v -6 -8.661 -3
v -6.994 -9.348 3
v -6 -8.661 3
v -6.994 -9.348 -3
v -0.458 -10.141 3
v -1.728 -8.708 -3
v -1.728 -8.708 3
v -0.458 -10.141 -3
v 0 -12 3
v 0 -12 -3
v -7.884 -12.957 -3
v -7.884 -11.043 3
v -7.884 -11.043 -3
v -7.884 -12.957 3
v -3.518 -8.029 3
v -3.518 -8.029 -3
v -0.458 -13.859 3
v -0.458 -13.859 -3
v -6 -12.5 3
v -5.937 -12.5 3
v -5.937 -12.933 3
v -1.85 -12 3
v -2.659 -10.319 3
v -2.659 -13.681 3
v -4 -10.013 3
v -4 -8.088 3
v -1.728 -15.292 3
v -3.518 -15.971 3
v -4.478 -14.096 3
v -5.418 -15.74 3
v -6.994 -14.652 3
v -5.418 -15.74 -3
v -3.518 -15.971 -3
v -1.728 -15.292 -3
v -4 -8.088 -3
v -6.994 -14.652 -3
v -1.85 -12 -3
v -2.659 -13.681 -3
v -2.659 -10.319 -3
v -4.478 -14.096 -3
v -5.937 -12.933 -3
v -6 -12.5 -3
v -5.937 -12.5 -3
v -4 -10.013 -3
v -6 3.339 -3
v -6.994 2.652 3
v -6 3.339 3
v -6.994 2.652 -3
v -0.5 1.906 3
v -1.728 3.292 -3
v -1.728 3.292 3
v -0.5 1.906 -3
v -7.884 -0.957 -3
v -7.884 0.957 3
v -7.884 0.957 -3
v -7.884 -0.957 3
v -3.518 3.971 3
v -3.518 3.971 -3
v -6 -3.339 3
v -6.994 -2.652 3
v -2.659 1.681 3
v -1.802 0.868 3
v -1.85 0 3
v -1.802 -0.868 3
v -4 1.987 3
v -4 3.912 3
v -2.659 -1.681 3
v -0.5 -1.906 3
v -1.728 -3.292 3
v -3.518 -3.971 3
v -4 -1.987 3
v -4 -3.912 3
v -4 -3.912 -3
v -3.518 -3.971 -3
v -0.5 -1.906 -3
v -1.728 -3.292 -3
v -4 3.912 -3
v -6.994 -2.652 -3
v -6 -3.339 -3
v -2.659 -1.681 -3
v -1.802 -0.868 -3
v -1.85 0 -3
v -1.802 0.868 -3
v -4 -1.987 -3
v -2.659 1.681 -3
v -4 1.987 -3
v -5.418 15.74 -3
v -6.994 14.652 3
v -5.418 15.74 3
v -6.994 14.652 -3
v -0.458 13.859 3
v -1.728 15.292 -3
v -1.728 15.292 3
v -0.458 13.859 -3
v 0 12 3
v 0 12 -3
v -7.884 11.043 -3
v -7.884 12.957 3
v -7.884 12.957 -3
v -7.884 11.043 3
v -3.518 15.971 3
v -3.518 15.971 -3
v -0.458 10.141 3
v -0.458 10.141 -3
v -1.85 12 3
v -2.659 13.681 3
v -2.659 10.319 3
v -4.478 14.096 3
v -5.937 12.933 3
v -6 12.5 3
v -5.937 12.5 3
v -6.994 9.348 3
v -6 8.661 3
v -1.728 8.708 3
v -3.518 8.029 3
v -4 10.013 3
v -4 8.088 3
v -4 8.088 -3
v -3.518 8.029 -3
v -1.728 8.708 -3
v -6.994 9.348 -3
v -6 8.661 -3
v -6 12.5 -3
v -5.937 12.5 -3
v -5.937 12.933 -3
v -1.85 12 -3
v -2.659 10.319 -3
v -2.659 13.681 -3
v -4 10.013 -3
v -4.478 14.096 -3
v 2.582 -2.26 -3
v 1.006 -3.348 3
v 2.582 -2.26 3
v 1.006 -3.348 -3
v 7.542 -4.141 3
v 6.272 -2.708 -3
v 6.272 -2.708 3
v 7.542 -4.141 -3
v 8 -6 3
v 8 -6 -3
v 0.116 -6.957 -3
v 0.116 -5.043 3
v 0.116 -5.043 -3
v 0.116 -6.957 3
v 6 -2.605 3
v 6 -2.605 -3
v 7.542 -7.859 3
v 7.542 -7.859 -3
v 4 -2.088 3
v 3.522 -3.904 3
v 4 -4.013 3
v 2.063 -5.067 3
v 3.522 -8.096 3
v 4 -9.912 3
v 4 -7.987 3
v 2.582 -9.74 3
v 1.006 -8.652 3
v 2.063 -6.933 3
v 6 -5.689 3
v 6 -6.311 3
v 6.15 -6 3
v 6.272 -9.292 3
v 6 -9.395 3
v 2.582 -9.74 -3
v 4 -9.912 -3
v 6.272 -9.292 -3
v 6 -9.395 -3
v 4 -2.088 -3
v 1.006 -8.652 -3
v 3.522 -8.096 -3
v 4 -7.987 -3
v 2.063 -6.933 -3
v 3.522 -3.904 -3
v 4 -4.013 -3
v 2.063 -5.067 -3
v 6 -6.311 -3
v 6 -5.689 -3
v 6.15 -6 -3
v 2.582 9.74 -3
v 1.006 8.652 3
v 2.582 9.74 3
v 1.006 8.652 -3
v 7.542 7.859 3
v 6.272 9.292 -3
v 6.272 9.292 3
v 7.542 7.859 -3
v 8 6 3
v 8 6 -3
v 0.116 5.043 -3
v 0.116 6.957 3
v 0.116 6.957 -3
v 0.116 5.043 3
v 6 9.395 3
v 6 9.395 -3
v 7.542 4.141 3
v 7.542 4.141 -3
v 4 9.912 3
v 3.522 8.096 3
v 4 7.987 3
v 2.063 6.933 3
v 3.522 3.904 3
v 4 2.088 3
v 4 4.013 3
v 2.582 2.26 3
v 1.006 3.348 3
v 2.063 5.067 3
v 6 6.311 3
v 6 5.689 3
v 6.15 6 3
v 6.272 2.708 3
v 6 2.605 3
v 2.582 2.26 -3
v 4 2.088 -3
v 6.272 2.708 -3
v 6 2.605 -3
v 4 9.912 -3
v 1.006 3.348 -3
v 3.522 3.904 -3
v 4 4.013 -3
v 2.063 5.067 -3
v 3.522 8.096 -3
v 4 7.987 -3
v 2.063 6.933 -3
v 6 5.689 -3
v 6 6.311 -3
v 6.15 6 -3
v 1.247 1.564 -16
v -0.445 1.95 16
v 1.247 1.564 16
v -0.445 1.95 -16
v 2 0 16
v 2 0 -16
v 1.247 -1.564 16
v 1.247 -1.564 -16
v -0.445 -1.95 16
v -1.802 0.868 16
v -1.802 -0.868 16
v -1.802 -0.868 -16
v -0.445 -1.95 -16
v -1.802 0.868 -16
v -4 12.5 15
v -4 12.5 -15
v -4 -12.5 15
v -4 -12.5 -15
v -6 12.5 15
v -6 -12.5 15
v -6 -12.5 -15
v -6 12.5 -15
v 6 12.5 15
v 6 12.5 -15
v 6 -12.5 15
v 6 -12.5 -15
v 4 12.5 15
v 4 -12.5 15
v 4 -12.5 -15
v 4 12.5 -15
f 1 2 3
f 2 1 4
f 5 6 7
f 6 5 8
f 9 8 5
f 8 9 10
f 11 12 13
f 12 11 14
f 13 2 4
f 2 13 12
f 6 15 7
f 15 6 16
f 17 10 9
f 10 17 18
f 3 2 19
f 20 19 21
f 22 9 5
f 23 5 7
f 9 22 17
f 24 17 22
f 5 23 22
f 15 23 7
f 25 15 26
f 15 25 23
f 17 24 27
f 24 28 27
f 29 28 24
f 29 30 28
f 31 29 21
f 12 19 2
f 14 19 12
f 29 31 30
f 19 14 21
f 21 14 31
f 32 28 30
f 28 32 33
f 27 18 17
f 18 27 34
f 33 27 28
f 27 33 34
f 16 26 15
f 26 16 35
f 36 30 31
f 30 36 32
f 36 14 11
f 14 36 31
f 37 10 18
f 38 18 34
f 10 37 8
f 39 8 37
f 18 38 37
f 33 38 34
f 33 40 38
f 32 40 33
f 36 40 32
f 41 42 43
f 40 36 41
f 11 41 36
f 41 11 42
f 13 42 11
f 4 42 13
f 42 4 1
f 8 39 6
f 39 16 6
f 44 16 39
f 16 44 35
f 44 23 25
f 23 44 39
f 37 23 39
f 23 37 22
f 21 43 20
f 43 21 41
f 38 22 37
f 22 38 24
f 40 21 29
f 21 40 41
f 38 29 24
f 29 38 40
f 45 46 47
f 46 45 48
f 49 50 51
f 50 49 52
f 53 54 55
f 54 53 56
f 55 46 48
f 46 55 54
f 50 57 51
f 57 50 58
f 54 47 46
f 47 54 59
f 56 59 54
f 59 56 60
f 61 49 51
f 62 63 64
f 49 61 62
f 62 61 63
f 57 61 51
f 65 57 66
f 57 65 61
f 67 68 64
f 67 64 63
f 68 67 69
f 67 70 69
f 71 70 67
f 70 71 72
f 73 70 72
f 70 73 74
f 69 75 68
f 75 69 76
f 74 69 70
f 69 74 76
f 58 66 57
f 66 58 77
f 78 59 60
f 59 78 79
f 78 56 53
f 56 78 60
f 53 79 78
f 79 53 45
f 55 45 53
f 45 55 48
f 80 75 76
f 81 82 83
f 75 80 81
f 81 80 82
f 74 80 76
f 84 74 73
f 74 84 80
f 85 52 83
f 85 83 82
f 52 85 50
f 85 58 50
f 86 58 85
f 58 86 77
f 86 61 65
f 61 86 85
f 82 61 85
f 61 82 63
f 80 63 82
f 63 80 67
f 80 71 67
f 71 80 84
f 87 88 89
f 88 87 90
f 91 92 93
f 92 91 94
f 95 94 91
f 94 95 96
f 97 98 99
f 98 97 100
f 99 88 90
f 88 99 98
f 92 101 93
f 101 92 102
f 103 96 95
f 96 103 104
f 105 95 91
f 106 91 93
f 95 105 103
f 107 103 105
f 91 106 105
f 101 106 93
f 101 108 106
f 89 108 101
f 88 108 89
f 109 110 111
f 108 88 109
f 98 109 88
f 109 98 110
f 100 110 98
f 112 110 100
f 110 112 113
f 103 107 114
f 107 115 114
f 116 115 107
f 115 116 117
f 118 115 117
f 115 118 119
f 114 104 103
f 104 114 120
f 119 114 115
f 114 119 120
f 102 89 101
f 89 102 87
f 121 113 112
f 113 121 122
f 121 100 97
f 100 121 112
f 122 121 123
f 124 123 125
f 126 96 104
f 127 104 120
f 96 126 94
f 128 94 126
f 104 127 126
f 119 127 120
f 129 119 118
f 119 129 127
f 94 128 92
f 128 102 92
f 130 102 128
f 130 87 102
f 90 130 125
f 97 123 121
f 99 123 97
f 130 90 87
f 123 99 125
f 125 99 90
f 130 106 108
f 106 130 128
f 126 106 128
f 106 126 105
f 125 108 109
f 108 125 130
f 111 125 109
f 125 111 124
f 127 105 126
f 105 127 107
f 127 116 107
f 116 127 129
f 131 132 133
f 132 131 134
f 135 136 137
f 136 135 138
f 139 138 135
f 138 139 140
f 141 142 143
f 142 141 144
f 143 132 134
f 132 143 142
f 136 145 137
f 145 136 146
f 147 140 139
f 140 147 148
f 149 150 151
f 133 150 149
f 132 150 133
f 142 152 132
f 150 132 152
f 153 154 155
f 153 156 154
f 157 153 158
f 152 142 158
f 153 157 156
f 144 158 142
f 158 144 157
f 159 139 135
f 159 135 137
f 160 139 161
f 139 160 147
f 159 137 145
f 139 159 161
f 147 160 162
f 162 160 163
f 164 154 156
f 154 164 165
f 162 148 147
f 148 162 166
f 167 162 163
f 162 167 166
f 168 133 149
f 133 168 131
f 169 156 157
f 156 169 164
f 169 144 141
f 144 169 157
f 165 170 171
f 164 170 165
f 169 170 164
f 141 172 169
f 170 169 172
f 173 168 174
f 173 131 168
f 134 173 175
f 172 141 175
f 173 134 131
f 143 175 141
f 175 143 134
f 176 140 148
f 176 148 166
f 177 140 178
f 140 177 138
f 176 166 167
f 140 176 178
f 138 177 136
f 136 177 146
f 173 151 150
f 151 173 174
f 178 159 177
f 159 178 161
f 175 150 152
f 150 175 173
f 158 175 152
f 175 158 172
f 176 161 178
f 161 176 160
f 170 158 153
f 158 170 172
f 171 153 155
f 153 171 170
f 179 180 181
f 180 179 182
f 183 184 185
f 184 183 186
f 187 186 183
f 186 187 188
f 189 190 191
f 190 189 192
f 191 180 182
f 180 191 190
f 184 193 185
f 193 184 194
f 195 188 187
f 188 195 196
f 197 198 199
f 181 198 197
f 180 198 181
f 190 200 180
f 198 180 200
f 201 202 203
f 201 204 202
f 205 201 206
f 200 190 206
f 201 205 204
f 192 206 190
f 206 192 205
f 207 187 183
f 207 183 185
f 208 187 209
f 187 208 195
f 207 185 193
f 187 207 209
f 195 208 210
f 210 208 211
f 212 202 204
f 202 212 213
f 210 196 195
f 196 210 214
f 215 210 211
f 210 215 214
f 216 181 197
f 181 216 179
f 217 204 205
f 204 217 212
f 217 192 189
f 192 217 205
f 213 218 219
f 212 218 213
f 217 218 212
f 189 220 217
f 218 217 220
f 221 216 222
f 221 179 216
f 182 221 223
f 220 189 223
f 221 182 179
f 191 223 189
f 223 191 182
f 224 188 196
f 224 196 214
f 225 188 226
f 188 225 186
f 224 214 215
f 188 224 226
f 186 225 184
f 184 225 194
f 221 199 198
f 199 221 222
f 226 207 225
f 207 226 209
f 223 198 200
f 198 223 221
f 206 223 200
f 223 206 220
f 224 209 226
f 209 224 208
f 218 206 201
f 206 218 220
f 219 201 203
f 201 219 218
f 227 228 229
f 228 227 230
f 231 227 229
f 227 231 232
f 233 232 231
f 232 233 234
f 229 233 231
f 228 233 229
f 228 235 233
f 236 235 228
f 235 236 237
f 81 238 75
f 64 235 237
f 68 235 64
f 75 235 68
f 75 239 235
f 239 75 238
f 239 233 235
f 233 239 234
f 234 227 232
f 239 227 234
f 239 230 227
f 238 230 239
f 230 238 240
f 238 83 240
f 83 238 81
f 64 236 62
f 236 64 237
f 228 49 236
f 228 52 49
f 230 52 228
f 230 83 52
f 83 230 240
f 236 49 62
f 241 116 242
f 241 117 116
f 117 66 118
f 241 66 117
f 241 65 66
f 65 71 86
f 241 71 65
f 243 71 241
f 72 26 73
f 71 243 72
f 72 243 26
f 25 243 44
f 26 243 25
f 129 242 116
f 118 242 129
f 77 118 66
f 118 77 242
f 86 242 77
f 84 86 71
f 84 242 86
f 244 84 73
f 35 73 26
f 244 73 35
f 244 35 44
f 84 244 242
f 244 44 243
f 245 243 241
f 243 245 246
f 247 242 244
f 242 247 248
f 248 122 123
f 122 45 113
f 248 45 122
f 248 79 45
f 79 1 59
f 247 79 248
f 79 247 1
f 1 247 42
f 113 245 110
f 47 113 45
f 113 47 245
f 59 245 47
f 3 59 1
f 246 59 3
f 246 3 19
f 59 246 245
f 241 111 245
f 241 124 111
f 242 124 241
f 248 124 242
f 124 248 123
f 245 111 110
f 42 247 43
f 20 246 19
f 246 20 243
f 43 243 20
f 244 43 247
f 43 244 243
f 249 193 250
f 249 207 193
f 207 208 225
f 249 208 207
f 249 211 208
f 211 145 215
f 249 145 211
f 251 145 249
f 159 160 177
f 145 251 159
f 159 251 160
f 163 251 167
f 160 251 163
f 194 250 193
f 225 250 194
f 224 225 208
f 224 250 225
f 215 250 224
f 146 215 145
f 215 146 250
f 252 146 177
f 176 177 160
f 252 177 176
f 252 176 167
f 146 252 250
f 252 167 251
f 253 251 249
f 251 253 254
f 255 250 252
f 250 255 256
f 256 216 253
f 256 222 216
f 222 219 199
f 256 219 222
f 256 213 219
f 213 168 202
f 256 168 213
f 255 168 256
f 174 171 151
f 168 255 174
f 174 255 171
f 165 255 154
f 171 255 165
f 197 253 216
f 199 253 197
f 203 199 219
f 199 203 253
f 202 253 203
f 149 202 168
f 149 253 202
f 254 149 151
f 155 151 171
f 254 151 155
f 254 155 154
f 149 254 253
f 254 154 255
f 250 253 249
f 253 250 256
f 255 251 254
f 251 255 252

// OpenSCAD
// Parameters
leaf_width = 25;
leaf_height = 30;
leaf_thickness = 2;
pin_diameter = 4;
pin_length = 32;
knuckle_outer_diameter = 8;
knuckle_inner_diameter = pin_diameter + 0.3;
knuckle_height = 6; // 30mm / 5 equal parts
num_knuckles_left = 3;
num_knuckles_right = 2;
m3_countersink_diameter = 6;
m3_countersink_depth = 1;
m3_hole_diameter = 3.2;
m3_hole_spacing = 8;

module pin() {
    cylinder(h = pin_length, d = pin_diameter, center = true);
}

module knuckle(side) {
    difference() {
        cylinder(h = knuckle_height, d = knuckle_outer_diameter, center = true);
        // Ensure the hole goes all the way through the knuckle
        cylinder(h = knuckle_height + 0.1, d = knuckle_inner_diameter, center = true);
    }
}

// Helper module for creating a conical void for the countersink
module countersink_hole(depth, d_outer, d_inner) {
    // This creates a frustum shape and then a cylinder.
    // The frustum is from the surface (z=0) to 'depth'.
    // The cylinder continues from 'depth' to 'leaf_thickness'.

    // Frustum part
    // hull() creates a shape connecting two 2D shapes.
    // We need to create two circles at the start and end of the frustum.
    hull() {
        circle(d = d_outer);
        translate([depth, 0, 0]) circle(d = d_inner);
    }

    // Cylinder part for the through hole
    translate([depth, 0, 0]) {
        cylinder(h = leaf_thickness - depth, d = d_inner, center = false);
    }
}

module leaf(side) {
    // Base leaf shape
    cube([leaf_thickness, leaf_width, leaf_height], center = true);

    // Mount holes
    // The prompt states "板の縦方向に 8mm 間隔" which corresponds to the leaf's height (30mm).
    // The leaf is centered at Z=0. So Z-coordinates for holes will be -m3_hole_spacing, 0, m3_hole_spacing.
    // The holes are on the surface of the leaf, so their X-coordinate should be at the edge of the leaf.
    // The X-coordinate for the surface is `side * leaf_thickness / 2`.

    // For the countersink, we need to create a negative volume.
    // The countersink hole will be applied as a difference.
    // We need to position the countersink module correctly relative to the leaf's outer face.
    // The countersink module itself will be translated to the correct position on the leaf face.

    // Left leaf holes (side = -1)
    if (side == -1) {
        translate([leaf_thickness / 2, 0, -m3_hole_spacing]) {
            // The countersink_hole module assumes it's on a face and creates a void extending into the leaf.
            // We need to ensure it cuts *into* the leaf.
            // The default orientation of the countersink_hole module is along the X-axis.
            // For the left leaf, the outer face is at X = leaf_thickness / 2.
            // The countersink should be placed at this face and extend inwards (towards X=0).
            // We can achieve this by using rotate to align the countersink module's creation axis.
            rotate([0, 0, 0]) { // No rotation needed if countersink_hole is built along X
                difference() {
                    // This is a placeholder for the leaf's actual geometry that the countersink will subtract from.
                    // However, the countersink_hole module is designed to be placed as a void.
                    // Let's rethink the structure. We should create the leaf as solid, then subtract the countersinks.

                    // Let's redefine the countersink_hole to create the negative shape.
                    // We can then apply this to the leaf.

                    // Rebuilding the countersink_hole module as a subtractive part.
                    // This module will be called within a difference() operation on the leaf.
                    // The countersink_hole module needs to be aligned correctly.
                    // For the left leaf (side = -1), the face is at +leaf_thickness/2. The countersink extends inwards.
                    // For the right leaf (side = 1), the face is at -leaf_thickness/2. The countersink extends inwards.
                    // The countersink_hole module is defined to create a void along its local X-axis.
                    // So, we need to translate and possibly rotate it.

                    // Correct approach: Position the countersink void at the leaf's face and extrude inwards.
                    // The countersink_hole module is already designed to create this void.
                    // We need to place it on the correct face.

                    // Left leaf: face at X = leaf_thickness/2. Extrude towards X=0.
                    translate([leaf_thickness / 2, 0, -m3_hole_spacing]) {
                        rotate([0, 90, 0]) { // Rotate to align hole creation along X-axis
                            countersink_hole(m3_countersink_depth, m3_countersink_diameter, m3_hole_diameter);
                        }
                    }
                }
            }
        }
        translate([leaf_thickness / 2, 0, 0]) {
            rotate([0, 90, 0]) {
                countersink_hole(m3_countersink_depth, m3_countersink_diameter, m3_hole_diameter);
            }
        }
        translate([leaf_thickness / 2, 0, m3_hole_spacing]) {
            rotate([0, 90, 0]) {
                countersink_hole(m3_countersink_depth, m3_countersink_diameter, m3_hole_diameter);
            }
        }
    }

    // Right leaf holes (side = 1)
    if (side == 1) {
        translate([-leaf_thickness / 2, 0, -m3_hole_spacing]) {
            // Right leaf: face at X = -leaf_thickness/2. Extrude towards X=0.
            // The countersink_hole module extrudes along its local X.
            // So we need to rotate it to face inwards.
            rotate([0, -90, 0]) { // Rotate to align hole creation along X-axis, pointing inwards
                countersink_hole(m3_countersink_depth, m3_countersink_diameter, m3_hole_diameter);
            }
        }
        translate([-leaf_thickness / 2, 0, 0]) {
            rotate([0, -90, 0]) {
                countersink_hole(m3_countersink_depth, m3_countersink_diameter, m3_hole_diameter);
            }
        }
        translate([-leaf_thickness / 2, 0, m3_hole_spacing]) {
            rotate([0, -90, 0]) {
                countersink_hole(m3_countersink_depth, m3_countersink_diameter, m3_hole_diameter);
            }
        }
    }
}

// Assemble the hinge in 180 degree open state
module butt_hinge() {
    // Pin
    // The pin's length is 32mm, knuckles are 6mm high each.
    // Total height of knuckles on one side: 3 * 6 = 18mm, 2 * 6 = 12mm.
    // The pin should extend 1mm beyond the outermost knuckles on each side.
    // Left knuckles are at Y = -12, 0, 12. Outermost is at Y=12.
    // Right knuckles are at Y = -6, 6. Outermost is at Y=6.
    // The pin should extend from Y = -15 to Y = 15 (approx).
    // Pin length 32mm is correct for this. It extends from -16 to 16.

    pin();

    // Left knuckles and leaf plate
    // Knuckle Y-positions for left leaf: [-12, 0, 12]
    // These positions are relative to the center of the hinge barrel stack (Y-axis).
    // The knuckle centers are offset from the Y-axis.
    // The left knuckles are on the X < 0 side of the pin's YZ plane.
    // Their X-center position is -(knuckle_outer_diameter/2).
    for (i = [0 : num_knuckles_left - 1]) {
        translate([-knuckle_outer_diameter/2, [-12, 0, 12][i], 0]) {
            knuckle(-1); // -1 indicates left side
        }
    }
    // Left leaf plate positioned to the outside of its knuckles.
    // The leaf plate's face is aligned with the outer edge of the knuckles.
    // The leaf thickness is 2mm.
    // The X-position of the left leaf's center should be such that its face is at the edge of the outermost knuckle.
    // Outermost left knuckle center is at X = -knuckle_outer_diameter/2.
    // The leaf's face should be at X = -knuckle_outer_diameter/2.
    // So the leaf's center X should be -knuckle_outer_diameter/2 - leaf_thickness/2.
    translate([-(knuckle_outer_diameter/2 + leaf_thickness/2), 0, 0]) {
        difference() {
            leaf(-1); // -1 indicates left side
            // The leaf module itself will now contain the subtractive parts for holes.
        }
    }

    // Right knuckles and leaf plate
    // Knuckle Y-positions for right leaf: [-6, 6]
    // The right knuckles are on the X > 0 side of the pin's YZ plane.
    // Their X-center position is +(knuckle_outer_diameter/2).
    for (i = [0 : num_knuckles_right - 1]) {
        translate([knuckle_outer_diameter/2, [-6, 6][i], 0]) {
            knuckle(1); // 1 indicates right side
        }
    }
    // Right leaf plate positioned to the outside of its knuckles.
    // The X-position of the right leaf's center should be such that its face is at the edge of the outermost knuckle.
    // Outermost right knuckle center is at X = knuckle_outer_diameter/2.
    // The leaf's face should be at X = knuckle_outer_diameter/2.
    // So the leaf's center X should be knuckle_outer_diameter/2 + leaf_thickness/2.
    translate([knuckle_outer_diameter/2 + leaf_thickness/2, 0, 0]) {
        difference() {
            leaf(1); // 1 indicates right side
        }
    }
}

// Position the hinge at the origin for final rendering
translate([0, 0, 0]) {
    butt_hinge();
}
